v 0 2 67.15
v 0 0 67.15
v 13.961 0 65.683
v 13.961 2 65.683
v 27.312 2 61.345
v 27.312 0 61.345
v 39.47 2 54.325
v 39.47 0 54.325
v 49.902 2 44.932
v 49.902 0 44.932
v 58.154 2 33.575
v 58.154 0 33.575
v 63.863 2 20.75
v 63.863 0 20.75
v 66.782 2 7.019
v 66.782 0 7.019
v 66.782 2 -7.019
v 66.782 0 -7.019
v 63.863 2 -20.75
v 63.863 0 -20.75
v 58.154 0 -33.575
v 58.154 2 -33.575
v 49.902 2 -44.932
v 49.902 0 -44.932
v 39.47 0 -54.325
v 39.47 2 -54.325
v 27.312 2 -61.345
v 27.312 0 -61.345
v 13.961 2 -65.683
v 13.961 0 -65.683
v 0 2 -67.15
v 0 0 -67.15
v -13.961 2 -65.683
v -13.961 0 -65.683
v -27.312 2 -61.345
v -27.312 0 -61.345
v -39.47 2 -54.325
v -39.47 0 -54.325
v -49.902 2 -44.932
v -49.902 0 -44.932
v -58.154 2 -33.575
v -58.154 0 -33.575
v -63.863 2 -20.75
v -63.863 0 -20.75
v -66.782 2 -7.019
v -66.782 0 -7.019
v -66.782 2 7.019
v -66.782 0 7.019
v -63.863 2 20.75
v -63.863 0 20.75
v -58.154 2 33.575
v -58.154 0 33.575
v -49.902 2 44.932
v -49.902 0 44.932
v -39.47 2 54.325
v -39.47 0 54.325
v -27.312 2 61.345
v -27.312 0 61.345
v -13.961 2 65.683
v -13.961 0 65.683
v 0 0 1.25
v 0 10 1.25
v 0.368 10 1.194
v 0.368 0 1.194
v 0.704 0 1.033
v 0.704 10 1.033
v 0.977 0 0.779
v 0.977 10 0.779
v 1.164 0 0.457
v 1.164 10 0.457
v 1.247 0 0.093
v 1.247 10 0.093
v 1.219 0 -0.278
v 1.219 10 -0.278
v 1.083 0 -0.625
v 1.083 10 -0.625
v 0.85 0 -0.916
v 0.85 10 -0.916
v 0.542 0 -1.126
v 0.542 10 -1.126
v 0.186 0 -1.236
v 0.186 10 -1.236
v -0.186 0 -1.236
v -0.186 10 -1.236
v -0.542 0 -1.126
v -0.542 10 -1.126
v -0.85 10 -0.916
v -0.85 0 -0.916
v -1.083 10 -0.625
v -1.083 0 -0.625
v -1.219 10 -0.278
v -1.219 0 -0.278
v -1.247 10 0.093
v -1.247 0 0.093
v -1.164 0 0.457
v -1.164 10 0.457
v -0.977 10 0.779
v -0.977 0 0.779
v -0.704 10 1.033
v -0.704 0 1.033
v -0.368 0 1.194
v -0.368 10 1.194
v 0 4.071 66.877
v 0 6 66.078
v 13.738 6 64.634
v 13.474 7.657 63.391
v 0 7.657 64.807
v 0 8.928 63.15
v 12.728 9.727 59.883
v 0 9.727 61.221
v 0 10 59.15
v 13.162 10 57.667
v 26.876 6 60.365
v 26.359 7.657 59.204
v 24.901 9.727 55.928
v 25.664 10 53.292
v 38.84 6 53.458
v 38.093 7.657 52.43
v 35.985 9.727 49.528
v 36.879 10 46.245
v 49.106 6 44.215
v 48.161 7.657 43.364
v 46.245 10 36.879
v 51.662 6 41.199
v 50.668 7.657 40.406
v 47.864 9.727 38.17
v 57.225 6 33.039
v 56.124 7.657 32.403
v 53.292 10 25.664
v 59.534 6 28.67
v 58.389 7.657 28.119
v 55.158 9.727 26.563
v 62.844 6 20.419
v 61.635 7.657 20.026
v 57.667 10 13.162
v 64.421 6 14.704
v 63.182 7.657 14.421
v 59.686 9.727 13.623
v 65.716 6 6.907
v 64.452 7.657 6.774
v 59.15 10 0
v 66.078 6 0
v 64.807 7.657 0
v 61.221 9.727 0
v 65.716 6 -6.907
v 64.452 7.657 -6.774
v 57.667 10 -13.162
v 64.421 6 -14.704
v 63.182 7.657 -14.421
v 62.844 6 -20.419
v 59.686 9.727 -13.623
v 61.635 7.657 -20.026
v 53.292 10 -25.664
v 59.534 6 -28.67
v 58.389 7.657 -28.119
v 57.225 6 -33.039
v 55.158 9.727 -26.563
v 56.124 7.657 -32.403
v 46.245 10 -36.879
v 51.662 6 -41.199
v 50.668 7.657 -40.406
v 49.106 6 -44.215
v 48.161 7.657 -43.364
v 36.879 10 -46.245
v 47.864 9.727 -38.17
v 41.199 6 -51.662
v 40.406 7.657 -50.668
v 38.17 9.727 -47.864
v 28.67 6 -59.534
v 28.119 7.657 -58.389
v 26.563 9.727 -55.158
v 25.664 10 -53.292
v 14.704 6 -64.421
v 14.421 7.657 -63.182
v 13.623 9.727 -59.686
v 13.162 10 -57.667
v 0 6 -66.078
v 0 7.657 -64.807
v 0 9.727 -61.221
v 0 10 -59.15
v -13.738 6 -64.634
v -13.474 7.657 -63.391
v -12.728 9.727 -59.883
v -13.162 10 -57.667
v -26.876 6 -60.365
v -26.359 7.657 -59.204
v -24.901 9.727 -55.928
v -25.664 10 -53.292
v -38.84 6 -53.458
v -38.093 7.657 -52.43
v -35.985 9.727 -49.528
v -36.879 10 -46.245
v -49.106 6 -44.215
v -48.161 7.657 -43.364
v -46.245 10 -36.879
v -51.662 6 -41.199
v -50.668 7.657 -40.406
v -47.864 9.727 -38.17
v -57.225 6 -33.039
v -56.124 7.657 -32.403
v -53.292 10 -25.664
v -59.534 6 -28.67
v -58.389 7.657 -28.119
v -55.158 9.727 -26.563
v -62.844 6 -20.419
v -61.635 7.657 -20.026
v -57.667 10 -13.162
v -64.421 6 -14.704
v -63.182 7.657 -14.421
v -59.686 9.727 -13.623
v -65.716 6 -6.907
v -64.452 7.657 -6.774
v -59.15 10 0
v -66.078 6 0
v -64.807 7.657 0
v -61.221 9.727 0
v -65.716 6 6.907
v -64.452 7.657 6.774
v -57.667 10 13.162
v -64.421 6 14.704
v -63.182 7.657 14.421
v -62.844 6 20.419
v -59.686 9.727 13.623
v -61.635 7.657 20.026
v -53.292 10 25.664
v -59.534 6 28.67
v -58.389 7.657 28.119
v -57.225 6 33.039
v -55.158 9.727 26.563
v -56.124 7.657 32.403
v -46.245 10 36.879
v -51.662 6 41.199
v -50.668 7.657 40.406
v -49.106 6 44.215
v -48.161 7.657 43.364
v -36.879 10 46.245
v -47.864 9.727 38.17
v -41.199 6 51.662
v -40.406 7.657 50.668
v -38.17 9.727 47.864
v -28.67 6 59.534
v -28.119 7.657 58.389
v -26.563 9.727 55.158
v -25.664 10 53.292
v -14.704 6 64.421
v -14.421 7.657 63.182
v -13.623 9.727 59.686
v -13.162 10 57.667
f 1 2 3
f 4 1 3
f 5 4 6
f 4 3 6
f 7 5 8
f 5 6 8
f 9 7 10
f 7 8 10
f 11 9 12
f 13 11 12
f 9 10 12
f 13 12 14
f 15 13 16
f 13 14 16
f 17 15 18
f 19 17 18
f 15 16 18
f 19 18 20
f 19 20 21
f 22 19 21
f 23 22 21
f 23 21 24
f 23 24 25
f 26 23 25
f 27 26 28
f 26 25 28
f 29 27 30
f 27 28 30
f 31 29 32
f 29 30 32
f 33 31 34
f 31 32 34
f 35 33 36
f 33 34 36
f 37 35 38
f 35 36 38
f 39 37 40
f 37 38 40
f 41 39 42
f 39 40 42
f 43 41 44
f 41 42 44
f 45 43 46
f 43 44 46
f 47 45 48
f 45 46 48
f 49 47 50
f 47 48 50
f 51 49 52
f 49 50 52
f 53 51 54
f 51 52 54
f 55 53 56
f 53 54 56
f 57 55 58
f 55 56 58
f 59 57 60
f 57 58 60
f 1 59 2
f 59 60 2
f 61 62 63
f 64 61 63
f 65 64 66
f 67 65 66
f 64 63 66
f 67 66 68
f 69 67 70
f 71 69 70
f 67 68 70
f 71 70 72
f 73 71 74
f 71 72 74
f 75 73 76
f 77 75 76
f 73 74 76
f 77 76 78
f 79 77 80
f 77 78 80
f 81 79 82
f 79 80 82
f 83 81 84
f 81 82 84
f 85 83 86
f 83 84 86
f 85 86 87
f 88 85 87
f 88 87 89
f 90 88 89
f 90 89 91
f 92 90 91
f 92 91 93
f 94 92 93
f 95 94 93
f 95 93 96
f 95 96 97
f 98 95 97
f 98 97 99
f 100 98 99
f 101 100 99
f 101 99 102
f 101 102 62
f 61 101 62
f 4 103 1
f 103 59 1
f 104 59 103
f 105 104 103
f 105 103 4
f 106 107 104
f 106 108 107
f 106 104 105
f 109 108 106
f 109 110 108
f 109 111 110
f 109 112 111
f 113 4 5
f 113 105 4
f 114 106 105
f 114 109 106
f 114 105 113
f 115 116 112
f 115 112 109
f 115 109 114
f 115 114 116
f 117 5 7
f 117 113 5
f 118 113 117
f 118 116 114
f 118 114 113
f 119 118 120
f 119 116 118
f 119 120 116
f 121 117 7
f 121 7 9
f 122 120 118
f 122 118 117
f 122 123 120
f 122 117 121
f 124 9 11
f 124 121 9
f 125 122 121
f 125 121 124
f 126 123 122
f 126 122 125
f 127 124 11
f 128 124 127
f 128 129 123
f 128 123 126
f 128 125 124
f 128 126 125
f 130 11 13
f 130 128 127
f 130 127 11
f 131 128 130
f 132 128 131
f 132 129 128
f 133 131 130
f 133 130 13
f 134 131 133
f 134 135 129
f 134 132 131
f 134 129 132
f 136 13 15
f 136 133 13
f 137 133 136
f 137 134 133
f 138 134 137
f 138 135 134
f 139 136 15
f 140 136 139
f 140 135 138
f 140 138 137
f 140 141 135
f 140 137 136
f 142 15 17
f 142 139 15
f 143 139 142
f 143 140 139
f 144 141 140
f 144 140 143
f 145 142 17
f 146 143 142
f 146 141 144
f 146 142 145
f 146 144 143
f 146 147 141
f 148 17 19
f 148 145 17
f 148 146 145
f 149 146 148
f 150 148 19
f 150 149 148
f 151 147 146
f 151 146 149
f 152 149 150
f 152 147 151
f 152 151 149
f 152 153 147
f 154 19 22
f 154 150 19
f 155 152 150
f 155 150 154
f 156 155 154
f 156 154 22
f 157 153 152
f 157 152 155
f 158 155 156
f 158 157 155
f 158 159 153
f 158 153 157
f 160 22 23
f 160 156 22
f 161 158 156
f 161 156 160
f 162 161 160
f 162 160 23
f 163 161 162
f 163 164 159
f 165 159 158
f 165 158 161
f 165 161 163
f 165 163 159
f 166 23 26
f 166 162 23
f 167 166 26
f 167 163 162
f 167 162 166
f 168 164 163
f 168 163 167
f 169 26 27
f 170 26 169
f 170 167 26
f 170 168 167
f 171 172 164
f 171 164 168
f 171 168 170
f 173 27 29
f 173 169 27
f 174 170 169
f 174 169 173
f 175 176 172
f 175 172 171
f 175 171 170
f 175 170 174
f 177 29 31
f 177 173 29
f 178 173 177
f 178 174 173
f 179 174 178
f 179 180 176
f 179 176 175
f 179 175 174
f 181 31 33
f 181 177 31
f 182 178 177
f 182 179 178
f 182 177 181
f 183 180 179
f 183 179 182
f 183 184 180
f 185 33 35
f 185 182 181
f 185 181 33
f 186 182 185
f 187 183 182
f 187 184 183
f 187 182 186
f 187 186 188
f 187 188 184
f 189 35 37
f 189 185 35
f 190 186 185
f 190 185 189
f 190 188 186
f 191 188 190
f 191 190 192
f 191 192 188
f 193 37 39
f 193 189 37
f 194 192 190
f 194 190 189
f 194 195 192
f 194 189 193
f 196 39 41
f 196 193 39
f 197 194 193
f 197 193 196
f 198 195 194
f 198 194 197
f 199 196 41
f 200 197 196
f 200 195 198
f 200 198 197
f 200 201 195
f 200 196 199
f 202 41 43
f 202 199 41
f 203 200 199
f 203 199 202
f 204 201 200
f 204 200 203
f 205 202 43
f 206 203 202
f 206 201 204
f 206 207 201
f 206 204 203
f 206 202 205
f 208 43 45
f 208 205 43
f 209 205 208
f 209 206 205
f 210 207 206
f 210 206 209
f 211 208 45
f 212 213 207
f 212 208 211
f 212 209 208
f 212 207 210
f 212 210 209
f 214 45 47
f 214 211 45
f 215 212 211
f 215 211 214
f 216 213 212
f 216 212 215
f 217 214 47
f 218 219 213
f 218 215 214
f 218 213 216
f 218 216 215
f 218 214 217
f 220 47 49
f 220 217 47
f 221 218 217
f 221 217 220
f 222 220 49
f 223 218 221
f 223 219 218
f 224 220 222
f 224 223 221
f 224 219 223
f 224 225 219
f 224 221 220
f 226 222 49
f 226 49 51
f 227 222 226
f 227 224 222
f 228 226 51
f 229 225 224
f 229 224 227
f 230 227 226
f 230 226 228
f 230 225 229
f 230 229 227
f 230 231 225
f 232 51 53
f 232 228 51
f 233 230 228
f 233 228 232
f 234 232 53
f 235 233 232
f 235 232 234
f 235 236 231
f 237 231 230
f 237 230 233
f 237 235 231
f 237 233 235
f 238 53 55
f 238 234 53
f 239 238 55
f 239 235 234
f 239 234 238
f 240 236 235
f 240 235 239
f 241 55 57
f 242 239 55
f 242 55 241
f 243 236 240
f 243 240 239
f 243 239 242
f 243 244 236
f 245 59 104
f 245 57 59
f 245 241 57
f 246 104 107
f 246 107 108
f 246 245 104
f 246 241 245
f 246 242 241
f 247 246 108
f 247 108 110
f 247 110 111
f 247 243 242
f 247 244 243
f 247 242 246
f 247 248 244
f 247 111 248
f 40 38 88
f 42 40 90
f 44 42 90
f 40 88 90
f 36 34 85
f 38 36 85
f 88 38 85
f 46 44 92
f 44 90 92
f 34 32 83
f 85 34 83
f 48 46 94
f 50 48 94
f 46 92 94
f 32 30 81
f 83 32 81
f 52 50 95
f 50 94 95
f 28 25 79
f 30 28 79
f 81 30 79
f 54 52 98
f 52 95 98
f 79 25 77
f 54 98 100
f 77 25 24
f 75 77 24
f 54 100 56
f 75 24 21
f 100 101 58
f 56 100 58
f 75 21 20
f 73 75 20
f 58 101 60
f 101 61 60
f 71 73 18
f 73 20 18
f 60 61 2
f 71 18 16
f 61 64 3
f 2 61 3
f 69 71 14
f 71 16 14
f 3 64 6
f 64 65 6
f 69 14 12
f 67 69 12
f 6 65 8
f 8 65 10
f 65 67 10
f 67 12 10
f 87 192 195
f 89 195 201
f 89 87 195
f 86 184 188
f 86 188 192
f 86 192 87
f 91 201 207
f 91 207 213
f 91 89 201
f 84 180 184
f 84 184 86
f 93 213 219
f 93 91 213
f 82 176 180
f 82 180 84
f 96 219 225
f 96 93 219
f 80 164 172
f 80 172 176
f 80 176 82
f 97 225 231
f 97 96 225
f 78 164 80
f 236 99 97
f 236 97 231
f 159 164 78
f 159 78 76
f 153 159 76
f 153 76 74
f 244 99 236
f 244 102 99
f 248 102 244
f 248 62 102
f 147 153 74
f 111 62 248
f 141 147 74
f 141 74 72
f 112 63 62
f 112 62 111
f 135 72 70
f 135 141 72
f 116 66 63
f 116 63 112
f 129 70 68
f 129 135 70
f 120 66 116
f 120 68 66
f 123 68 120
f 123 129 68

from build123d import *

# Parameters (mm, degrees)
SKETCH1_R           = 67.15
BOSS_EXTRUDE1_DEPTH = 10
FILLET1_R           = 8
CUT_EXTRUDE3_REACH  = 97.49
SKETCH4_R           = 1.25


with BuildPart() as part:
    # Sketch1 → Boss-Extrude1 (new body)
    with BuildSketch(Plane(origin=(0, 0, 0), x_dir=(1, 0, 0), z_dir=(0, 1, 0))):
        with Locations(Location((0, 0, 0), (0, 0, 270))):
            Circle(SKETCH1_R)
    extrude(amount=BOSS_EXTRUDE1_DEPTH)

    # Fillet1
    fillet1_edges = [part.edges().sort_by_distance(p)[0] for p in [
        (0, 10, -67.15),
    ]]
    fillet(fillet1_edges, radius=FILLET1_R)

    # Sketch4 → Cut-Extrude3 (cut, up to next)
    with BuildSketch(Plane(origin=(0, 10, 0), x_dir=(1, 0, 0), z_dir=(0, 1, 0)), mode=Mode.PRIVATE) as cut_extrude3_sk1:
        with Locations(Location((0, 0, 0), (0, 0, 270))):
            Circle(SKETCH4_R)
    cut_extrude3_tool1 = extrude(cut_extrude3_sk1.sketch, amount=-CUT_EXTRUDE3_REACH, mode=Mode.PRIVATE) & part.part
    add(cut_extrude3_tool1.solids().sort_by_distance((0, 10, 0))[0], mode=Mode.SUBTRACT)


solid = part.part
